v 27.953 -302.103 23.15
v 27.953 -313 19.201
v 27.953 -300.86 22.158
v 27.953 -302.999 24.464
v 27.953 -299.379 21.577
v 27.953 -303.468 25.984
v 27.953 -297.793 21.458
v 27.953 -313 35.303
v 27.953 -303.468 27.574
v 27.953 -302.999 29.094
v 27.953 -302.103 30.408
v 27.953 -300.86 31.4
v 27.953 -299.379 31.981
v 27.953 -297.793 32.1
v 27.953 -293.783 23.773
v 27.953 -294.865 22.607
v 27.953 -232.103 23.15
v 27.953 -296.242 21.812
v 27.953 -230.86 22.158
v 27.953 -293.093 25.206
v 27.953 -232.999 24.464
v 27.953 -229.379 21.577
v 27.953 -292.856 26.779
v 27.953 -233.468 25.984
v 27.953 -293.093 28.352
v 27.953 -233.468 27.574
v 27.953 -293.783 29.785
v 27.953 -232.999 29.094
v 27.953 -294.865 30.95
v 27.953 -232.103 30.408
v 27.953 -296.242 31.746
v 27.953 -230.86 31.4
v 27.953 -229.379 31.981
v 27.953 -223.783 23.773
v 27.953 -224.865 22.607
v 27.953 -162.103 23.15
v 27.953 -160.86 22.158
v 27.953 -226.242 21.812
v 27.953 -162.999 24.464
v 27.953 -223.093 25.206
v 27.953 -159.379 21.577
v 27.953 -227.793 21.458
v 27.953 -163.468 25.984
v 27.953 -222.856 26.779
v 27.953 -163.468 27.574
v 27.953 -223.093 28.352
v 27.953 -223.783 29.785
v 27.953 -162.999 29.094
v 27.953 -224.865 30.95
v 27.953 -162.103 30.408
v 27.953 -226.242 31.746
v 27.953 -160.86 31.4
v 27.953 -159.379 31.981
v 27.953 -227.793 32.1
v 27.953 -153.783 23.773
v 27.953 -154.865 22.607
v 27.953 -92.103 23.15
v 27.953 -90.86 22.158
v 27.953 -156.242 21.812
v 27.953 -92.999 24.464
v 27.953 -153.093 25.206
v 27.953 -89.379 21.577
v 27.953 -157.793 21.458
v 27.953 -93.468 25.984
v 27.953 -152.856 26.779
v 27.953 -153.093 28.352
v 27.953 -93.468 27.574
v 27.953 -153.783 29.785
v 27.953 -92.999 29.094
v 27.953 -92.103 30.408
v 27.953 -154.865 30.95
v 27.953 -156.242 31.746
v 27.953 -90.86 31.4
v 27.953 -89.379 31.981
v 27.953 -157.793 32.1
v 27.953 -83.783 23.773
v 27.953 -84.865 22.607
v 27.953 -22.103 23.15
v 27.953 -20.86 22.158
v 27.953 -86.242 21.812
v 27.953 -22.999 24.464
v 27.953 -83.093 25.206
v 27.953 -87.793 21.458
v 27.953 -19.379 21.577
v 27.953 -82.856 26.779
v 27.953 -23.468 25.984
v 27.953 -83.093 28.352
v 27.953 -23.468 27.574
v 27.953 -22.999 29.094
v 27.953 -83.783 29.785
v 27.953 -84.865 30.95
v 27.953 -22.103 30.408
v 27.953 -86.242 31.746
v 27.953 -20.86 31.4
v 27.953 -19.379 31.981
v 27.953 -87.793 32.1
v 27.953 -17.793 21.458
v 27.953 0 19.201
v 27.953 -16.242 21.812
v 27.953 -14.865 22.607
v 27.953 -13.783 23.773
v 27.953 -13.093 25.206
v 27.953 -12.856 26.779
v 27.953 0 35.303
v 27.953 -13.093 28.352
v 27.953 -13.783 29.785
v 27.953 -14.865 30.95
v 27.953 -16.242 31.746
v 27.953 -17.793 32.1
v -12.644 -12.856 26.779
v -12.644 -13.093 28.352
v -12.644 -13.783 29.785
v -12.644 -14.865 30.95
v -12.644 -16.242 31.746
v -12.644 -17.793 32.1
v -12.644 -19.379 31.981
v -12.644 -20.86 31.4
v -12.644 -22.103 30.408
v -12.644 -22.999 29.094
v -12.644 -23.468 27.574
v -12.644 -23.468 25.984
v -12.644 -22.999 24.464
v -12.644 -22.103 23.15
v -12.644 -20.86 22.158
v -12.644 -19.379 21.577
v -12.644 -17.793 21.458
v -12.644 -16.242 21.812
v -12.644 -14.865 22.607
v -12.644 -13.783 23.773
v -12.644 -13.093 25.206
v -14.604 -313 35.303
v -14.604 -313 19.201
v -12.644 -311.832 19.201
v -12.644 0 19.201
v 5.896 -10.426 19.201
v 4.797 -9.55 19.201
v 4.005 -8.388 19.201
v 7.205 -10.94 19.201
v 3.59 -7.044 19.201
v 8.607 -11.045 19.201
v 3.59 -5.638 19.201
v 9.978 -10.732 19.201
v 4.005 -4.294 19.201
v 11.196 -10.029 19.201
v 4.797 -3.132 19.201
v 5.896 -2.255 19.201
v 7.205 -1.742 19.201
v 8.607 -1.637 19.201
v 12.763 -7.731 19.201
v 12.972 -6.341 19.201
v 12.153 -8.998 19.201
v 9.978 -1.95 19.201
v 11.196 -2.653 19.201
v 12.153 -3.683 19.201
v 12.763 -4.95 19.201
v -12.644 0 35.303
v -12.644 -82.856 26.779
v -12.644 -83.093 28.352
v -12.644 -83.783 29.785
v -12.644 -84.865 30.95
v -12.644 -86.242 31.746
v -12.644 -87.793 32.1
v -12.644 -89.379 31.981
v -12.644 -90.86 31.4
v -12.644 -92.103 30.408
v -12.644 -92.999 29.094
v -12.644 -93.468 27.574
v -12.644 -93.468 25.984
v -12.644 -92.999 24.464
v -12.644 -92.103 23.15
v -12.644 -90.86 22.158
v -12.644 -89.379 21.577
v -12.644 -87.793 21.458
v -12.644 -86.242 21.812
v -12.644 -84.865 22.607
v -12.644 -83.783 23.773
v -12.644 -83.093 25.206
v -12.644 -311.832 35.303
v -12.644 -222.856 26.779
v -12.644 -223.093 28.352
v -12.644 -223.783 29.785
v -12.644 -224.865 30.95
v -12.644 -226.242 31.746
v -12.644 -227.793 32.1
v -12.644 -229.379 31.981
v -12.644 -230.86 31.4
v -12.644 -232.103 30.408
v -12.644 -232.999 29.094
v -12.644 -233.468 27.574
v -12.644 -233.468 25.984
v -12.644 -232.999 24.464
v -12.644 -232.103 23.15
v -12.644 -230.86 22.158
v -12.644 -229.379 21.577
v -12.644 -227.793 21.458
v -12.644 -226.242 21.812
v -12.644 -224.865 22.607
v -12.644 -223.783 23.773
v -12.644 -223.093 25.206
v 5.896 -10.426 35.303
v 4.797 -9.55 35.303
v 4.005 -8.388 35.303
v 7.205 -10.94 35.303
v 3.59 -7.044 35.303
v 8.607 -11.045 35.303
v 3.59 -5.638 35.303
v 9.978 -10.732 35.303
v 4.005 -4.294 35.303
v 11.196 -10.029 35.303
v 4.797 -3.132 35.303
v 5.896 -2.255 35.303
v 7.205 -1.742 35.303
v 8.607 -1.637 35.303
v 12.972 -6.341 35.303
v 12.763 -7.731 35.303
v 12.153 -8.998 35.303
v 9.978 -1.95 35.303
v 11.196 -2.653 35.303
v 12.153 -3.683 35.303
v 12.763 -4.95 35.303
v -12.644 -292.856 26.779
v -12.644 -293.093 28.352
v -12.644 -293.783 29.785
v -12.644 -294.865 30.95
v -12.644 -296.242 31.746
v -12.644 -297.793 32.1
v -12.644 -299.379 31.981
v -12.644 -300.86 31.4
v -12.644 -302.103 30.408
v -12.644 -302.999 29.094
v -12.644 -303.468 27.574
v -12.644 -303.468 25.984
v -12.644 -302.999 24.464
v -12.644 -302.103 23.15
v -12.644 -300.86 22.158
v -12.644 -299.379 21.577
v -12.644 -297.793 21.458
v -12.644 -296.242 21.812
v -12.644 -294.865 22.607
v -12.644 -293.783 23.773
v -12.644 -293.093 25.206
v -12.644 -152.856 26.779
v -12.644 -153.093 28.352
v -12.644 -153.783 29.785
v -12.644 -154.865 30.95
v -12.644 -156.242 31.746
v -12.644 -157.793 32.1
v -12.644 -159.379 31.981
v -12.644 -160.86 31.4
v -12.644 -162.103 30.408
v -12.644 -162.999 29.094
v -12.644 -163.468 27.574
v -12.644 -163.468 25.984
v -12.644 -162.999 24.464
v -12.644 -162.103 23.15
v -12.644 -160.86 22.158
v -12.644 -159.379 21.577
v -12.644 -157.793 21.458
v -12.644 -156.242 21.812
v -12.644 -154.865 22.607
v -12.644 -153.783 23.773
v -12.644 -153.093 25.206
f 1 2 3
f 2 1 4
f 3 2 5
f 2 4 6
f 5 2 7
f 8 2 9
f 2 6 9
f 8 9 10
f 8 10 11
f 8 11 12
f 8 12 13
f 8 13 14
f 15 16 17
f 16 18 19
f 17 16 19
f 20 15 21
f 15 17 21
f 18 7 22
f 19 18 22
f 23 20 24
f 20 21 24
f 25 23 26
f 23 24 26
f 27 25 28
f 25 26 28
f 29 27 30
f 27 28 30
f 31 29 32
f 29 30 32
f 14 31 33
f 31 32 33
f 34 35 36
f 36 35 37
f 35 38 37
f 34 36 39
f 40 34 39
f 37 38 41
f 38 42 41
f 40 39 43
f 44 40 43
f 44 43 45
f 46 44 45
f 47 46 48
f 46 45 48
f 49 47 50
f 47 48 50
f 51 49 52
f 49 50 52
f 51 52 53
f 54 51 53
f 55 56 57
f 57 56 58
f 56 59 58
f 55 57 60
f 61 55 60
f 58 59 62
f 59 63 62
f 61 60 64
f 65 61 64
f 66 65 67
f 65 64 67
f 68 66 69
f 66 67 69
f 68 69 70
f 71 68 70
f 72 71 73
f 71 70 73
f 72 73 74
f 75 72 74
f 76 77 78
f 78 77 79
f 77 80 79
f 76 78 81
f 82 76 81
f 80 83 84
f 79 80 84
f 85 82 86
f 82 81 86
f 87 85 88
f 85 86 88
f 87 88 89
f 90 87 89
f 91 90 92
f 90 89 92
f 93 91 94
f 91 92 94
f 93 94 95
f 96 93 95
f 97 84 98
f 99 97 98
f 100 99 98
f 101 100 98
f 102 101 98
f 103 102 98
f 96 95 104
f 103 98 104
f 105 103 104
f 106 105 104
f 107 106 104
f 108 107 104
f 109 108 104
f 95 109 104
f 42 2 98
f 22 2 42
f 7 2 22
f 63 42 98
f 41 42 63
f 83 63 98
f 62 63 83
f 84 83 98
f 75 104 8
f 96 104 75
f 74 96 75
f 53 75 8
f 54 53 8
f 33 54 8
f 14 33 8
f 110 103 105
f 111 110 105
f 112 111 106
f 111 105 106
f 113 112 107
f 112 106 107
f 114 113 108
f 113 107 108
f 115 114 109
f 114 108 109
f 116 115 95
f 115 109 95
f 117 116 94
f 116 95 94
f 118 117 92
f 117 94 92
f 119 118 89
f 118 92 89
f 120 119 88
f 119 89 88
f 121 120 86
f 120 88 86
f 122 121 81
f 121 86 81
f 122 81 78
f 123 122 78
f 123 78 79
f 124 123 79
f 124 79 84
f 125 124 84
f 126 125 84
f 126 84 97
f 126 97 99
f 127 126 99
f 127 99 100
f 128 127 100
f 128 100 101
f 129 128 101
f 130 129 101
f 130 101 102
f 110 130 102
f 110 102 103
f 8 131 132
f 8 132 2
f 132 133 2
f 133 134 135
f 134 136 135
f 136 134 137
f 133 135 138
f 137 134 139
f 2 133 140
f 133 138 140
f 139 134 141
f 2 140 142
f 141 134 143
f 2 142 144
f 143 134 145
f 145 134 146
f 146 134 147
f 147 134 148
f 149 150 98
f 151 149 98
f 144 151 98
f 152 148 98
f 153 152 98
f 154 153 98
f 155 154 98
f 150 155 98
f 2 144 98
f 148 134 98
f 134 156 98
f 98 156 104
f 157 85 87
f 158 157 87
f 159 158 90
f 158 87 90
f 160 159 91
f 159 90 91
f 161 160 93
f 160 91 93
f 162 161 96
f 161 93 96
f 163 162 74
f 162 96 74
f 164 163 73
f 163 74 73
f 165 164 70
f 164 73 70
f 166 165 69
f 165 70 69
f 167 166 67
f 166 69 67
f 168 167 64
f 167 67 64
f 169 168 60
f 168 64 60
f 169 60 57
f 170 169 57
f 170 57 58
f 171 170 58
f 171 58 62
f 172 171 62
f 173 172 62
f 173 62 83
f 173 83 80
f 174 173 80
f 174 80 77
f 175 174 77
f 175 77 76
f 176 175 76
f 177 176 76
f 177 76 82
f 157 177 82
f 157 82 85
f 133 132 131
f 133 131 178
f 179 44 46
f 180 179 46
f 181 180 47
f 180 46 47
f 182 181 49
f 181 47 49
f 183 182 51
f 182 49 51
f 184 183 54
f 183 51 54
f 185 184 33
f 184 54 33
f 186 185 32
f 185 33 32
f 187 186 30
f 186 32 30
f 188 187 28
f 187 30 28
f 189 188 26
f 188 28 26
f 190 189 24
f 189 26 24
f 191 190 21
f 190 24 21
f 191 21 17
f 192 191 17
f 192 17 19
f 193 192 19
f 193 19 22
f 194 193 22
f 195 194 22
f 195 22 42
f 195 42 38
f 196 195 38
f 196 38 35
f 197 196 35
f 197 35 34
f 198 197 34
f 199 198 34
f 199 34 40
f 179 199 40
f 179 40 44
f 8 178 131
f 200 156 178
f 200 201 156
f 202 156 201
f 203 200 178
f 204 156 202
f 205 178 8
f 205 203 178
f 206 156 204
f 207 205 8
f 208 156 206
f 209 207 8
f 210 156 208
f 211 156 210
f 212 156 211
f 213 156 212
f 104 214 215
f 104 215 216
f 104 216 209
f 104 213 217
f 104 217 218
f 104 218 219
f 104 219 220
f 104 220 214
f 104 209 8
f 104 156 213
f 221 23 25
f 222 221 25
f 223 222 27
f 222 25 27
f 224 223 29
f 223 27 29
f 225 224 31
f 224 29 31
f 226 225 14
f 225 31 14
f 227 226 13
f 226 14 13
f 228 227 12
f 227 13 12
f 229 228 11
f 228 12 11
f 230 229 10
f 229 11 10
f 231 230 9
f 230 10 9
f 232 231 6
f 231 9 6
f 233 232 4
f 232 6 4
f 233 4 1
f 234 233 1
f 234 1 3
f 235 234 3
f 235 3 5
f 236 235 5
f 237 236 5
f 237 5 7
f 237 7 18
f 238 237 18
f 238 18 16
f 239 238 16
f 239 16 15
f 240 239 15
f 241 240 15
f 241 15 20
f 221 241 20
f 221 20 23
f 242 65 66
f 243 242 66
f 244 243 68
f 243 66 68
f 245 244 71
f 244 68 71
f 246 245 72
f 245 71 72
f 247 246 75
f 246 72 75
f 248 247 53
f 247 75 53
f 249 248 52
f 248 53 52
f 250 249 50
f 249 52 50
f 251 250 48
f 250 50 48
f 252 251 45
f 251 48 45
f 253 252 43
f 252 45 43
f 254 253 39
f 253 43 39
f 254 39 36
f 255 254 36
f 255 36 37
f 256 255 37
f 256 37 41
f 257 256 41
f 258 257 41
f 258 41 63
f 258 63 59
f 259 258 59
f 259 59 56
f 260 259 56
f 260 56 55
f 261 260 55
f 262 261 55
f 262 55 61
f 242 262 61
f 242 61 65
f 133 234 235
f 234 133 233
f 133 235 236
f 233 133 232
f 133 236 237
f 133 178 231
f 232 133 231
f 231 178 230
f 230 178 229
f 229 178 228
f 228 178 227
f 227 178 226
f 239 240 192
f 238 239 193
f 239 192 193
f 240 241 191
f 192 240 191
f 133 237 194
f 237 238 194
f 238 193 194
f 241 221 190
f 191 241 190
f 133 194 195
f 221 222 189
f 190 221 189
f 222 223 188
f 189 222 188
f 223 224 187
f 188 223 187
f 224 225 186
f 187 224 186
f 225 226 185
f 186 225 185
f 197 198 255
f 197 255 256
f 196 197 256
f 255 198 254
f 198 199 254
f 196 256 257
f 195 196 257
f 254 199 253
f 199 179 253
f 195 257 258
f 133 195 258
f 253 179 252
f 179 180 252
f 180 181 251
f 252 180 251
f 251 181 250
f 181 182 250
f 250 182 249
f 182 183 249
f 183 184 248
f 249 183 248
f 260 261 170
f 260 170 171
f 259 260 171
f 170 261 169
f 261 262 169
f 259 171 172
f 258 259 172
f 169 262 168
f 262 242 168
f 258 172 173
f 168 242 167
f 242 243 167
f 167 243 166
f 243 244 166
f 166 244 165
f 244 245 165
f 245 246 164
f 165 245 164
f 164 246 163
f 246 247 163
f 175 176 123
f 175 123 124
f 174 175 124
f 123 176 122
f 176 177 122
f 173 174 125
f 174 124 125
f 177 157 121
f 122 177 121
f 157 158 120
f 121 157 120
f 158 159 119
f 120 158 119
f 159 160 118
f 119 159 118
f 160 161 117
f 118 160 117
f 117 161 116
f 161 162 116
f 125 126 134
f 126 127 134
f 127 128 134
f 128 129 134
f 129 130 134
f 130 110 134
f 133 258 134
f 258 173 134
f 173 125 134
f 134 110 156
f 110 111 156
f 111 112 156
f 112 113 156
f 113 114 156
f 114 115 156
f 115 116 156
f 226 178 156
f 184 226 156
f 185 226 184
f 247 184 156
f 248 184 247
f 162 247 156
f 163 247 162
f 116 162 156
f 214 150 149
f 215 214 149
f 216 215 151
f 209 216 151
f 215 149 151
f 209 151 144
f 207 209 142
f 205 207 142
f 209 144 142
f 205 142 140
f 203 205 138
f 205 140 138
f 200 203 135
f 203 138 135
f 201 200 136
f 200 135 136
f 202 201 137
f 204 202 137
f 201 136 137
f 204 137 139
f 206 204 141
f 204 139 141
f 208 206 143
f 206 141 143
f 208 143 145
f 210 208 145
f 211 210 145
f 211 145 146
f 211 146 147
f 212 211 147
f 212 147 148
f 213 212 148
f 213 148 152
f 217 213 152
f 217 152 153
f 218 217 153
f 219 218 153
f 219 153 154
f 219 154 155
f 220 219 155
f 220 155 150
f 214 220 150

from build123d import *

# Parameters (mm, degrees)
F0_W     = 63.378432
F0_H     = 16.102
F1_DEPTH = 313
F2_R     = 5.335787
F3_DEPTH = 63.379432
F5_R     = 4.717458
F6_DEPTH = 25
F8_DEPTH = 25
F9_DEPTH = 25


with BuildPart() as f1:
    # F0 (on Front) → F1 (new body)
    with BuildSketch(Plane.XZ):
        with Locations((-3.735943, 27.252212)):
            Rectangle(F0_W, F0_H)
    extrude(amount=F1_DEPTH)

    # F2 (on face) → F3 (cut, through all)
    with BuildSketch(Plane.YZ.offset(27.953273)):
        with Locations((-18.191617, 26.778789)):
            Circle(F2_R)
        with Locations((-88.191617, 26.778789)):
            Circle(F2_R)
        with Locations((-158.191617, 26.778789)):
            Circle(F2_R)
        with Locations((-228.191617, 26.778789)):
            Circle(F2_R)
        with Locations((-298.191617, 26.778789)):
            Circle(F2_R)
    extrude(amount=-F3_DEPTH, mode=Mode.SUBTRACT)

    # F5 (on face) → F6 (cut)
    with BuildSketch(Plane(origin=(0, 0, 19.201212), x_dir=(1, 0, 0), z_dir=(0, 0, -1))):
        with Locations((8.254815, 6.340917)):
            Circle(F5_R)
    extrude(amount=-F6_DEPTH, mode=Mode.SUBTRACT)

    # F7 (on face) → F8 (cut)
    with BuildSketch(Plane.XY.offset(35.303212)):
        Polygon((-34.219209, -324.690997), (-12.643897, -311.831832), (-12.643897, 0), (-35.135265, 11.57862), (-57.62665, 0), (-81.669144, -321.138591), align=None)
    extrude(amount=-F8_DEPTH, mode=Mode.SUBTRACT)

    # F5 (on face) → F9 (cut)
    with BuildSketch(Plane(origin=(0, 0, 19.201212), x_dir=(1, 0, 0), z_dir=(0, 0, -1))):
        with Locations((8.254815, 6.340917)):
            Circle(F5_R)
    extrude(amount=-F9_DEPTH, mode=Mode.SUBTRACT)


solid = f1.part
